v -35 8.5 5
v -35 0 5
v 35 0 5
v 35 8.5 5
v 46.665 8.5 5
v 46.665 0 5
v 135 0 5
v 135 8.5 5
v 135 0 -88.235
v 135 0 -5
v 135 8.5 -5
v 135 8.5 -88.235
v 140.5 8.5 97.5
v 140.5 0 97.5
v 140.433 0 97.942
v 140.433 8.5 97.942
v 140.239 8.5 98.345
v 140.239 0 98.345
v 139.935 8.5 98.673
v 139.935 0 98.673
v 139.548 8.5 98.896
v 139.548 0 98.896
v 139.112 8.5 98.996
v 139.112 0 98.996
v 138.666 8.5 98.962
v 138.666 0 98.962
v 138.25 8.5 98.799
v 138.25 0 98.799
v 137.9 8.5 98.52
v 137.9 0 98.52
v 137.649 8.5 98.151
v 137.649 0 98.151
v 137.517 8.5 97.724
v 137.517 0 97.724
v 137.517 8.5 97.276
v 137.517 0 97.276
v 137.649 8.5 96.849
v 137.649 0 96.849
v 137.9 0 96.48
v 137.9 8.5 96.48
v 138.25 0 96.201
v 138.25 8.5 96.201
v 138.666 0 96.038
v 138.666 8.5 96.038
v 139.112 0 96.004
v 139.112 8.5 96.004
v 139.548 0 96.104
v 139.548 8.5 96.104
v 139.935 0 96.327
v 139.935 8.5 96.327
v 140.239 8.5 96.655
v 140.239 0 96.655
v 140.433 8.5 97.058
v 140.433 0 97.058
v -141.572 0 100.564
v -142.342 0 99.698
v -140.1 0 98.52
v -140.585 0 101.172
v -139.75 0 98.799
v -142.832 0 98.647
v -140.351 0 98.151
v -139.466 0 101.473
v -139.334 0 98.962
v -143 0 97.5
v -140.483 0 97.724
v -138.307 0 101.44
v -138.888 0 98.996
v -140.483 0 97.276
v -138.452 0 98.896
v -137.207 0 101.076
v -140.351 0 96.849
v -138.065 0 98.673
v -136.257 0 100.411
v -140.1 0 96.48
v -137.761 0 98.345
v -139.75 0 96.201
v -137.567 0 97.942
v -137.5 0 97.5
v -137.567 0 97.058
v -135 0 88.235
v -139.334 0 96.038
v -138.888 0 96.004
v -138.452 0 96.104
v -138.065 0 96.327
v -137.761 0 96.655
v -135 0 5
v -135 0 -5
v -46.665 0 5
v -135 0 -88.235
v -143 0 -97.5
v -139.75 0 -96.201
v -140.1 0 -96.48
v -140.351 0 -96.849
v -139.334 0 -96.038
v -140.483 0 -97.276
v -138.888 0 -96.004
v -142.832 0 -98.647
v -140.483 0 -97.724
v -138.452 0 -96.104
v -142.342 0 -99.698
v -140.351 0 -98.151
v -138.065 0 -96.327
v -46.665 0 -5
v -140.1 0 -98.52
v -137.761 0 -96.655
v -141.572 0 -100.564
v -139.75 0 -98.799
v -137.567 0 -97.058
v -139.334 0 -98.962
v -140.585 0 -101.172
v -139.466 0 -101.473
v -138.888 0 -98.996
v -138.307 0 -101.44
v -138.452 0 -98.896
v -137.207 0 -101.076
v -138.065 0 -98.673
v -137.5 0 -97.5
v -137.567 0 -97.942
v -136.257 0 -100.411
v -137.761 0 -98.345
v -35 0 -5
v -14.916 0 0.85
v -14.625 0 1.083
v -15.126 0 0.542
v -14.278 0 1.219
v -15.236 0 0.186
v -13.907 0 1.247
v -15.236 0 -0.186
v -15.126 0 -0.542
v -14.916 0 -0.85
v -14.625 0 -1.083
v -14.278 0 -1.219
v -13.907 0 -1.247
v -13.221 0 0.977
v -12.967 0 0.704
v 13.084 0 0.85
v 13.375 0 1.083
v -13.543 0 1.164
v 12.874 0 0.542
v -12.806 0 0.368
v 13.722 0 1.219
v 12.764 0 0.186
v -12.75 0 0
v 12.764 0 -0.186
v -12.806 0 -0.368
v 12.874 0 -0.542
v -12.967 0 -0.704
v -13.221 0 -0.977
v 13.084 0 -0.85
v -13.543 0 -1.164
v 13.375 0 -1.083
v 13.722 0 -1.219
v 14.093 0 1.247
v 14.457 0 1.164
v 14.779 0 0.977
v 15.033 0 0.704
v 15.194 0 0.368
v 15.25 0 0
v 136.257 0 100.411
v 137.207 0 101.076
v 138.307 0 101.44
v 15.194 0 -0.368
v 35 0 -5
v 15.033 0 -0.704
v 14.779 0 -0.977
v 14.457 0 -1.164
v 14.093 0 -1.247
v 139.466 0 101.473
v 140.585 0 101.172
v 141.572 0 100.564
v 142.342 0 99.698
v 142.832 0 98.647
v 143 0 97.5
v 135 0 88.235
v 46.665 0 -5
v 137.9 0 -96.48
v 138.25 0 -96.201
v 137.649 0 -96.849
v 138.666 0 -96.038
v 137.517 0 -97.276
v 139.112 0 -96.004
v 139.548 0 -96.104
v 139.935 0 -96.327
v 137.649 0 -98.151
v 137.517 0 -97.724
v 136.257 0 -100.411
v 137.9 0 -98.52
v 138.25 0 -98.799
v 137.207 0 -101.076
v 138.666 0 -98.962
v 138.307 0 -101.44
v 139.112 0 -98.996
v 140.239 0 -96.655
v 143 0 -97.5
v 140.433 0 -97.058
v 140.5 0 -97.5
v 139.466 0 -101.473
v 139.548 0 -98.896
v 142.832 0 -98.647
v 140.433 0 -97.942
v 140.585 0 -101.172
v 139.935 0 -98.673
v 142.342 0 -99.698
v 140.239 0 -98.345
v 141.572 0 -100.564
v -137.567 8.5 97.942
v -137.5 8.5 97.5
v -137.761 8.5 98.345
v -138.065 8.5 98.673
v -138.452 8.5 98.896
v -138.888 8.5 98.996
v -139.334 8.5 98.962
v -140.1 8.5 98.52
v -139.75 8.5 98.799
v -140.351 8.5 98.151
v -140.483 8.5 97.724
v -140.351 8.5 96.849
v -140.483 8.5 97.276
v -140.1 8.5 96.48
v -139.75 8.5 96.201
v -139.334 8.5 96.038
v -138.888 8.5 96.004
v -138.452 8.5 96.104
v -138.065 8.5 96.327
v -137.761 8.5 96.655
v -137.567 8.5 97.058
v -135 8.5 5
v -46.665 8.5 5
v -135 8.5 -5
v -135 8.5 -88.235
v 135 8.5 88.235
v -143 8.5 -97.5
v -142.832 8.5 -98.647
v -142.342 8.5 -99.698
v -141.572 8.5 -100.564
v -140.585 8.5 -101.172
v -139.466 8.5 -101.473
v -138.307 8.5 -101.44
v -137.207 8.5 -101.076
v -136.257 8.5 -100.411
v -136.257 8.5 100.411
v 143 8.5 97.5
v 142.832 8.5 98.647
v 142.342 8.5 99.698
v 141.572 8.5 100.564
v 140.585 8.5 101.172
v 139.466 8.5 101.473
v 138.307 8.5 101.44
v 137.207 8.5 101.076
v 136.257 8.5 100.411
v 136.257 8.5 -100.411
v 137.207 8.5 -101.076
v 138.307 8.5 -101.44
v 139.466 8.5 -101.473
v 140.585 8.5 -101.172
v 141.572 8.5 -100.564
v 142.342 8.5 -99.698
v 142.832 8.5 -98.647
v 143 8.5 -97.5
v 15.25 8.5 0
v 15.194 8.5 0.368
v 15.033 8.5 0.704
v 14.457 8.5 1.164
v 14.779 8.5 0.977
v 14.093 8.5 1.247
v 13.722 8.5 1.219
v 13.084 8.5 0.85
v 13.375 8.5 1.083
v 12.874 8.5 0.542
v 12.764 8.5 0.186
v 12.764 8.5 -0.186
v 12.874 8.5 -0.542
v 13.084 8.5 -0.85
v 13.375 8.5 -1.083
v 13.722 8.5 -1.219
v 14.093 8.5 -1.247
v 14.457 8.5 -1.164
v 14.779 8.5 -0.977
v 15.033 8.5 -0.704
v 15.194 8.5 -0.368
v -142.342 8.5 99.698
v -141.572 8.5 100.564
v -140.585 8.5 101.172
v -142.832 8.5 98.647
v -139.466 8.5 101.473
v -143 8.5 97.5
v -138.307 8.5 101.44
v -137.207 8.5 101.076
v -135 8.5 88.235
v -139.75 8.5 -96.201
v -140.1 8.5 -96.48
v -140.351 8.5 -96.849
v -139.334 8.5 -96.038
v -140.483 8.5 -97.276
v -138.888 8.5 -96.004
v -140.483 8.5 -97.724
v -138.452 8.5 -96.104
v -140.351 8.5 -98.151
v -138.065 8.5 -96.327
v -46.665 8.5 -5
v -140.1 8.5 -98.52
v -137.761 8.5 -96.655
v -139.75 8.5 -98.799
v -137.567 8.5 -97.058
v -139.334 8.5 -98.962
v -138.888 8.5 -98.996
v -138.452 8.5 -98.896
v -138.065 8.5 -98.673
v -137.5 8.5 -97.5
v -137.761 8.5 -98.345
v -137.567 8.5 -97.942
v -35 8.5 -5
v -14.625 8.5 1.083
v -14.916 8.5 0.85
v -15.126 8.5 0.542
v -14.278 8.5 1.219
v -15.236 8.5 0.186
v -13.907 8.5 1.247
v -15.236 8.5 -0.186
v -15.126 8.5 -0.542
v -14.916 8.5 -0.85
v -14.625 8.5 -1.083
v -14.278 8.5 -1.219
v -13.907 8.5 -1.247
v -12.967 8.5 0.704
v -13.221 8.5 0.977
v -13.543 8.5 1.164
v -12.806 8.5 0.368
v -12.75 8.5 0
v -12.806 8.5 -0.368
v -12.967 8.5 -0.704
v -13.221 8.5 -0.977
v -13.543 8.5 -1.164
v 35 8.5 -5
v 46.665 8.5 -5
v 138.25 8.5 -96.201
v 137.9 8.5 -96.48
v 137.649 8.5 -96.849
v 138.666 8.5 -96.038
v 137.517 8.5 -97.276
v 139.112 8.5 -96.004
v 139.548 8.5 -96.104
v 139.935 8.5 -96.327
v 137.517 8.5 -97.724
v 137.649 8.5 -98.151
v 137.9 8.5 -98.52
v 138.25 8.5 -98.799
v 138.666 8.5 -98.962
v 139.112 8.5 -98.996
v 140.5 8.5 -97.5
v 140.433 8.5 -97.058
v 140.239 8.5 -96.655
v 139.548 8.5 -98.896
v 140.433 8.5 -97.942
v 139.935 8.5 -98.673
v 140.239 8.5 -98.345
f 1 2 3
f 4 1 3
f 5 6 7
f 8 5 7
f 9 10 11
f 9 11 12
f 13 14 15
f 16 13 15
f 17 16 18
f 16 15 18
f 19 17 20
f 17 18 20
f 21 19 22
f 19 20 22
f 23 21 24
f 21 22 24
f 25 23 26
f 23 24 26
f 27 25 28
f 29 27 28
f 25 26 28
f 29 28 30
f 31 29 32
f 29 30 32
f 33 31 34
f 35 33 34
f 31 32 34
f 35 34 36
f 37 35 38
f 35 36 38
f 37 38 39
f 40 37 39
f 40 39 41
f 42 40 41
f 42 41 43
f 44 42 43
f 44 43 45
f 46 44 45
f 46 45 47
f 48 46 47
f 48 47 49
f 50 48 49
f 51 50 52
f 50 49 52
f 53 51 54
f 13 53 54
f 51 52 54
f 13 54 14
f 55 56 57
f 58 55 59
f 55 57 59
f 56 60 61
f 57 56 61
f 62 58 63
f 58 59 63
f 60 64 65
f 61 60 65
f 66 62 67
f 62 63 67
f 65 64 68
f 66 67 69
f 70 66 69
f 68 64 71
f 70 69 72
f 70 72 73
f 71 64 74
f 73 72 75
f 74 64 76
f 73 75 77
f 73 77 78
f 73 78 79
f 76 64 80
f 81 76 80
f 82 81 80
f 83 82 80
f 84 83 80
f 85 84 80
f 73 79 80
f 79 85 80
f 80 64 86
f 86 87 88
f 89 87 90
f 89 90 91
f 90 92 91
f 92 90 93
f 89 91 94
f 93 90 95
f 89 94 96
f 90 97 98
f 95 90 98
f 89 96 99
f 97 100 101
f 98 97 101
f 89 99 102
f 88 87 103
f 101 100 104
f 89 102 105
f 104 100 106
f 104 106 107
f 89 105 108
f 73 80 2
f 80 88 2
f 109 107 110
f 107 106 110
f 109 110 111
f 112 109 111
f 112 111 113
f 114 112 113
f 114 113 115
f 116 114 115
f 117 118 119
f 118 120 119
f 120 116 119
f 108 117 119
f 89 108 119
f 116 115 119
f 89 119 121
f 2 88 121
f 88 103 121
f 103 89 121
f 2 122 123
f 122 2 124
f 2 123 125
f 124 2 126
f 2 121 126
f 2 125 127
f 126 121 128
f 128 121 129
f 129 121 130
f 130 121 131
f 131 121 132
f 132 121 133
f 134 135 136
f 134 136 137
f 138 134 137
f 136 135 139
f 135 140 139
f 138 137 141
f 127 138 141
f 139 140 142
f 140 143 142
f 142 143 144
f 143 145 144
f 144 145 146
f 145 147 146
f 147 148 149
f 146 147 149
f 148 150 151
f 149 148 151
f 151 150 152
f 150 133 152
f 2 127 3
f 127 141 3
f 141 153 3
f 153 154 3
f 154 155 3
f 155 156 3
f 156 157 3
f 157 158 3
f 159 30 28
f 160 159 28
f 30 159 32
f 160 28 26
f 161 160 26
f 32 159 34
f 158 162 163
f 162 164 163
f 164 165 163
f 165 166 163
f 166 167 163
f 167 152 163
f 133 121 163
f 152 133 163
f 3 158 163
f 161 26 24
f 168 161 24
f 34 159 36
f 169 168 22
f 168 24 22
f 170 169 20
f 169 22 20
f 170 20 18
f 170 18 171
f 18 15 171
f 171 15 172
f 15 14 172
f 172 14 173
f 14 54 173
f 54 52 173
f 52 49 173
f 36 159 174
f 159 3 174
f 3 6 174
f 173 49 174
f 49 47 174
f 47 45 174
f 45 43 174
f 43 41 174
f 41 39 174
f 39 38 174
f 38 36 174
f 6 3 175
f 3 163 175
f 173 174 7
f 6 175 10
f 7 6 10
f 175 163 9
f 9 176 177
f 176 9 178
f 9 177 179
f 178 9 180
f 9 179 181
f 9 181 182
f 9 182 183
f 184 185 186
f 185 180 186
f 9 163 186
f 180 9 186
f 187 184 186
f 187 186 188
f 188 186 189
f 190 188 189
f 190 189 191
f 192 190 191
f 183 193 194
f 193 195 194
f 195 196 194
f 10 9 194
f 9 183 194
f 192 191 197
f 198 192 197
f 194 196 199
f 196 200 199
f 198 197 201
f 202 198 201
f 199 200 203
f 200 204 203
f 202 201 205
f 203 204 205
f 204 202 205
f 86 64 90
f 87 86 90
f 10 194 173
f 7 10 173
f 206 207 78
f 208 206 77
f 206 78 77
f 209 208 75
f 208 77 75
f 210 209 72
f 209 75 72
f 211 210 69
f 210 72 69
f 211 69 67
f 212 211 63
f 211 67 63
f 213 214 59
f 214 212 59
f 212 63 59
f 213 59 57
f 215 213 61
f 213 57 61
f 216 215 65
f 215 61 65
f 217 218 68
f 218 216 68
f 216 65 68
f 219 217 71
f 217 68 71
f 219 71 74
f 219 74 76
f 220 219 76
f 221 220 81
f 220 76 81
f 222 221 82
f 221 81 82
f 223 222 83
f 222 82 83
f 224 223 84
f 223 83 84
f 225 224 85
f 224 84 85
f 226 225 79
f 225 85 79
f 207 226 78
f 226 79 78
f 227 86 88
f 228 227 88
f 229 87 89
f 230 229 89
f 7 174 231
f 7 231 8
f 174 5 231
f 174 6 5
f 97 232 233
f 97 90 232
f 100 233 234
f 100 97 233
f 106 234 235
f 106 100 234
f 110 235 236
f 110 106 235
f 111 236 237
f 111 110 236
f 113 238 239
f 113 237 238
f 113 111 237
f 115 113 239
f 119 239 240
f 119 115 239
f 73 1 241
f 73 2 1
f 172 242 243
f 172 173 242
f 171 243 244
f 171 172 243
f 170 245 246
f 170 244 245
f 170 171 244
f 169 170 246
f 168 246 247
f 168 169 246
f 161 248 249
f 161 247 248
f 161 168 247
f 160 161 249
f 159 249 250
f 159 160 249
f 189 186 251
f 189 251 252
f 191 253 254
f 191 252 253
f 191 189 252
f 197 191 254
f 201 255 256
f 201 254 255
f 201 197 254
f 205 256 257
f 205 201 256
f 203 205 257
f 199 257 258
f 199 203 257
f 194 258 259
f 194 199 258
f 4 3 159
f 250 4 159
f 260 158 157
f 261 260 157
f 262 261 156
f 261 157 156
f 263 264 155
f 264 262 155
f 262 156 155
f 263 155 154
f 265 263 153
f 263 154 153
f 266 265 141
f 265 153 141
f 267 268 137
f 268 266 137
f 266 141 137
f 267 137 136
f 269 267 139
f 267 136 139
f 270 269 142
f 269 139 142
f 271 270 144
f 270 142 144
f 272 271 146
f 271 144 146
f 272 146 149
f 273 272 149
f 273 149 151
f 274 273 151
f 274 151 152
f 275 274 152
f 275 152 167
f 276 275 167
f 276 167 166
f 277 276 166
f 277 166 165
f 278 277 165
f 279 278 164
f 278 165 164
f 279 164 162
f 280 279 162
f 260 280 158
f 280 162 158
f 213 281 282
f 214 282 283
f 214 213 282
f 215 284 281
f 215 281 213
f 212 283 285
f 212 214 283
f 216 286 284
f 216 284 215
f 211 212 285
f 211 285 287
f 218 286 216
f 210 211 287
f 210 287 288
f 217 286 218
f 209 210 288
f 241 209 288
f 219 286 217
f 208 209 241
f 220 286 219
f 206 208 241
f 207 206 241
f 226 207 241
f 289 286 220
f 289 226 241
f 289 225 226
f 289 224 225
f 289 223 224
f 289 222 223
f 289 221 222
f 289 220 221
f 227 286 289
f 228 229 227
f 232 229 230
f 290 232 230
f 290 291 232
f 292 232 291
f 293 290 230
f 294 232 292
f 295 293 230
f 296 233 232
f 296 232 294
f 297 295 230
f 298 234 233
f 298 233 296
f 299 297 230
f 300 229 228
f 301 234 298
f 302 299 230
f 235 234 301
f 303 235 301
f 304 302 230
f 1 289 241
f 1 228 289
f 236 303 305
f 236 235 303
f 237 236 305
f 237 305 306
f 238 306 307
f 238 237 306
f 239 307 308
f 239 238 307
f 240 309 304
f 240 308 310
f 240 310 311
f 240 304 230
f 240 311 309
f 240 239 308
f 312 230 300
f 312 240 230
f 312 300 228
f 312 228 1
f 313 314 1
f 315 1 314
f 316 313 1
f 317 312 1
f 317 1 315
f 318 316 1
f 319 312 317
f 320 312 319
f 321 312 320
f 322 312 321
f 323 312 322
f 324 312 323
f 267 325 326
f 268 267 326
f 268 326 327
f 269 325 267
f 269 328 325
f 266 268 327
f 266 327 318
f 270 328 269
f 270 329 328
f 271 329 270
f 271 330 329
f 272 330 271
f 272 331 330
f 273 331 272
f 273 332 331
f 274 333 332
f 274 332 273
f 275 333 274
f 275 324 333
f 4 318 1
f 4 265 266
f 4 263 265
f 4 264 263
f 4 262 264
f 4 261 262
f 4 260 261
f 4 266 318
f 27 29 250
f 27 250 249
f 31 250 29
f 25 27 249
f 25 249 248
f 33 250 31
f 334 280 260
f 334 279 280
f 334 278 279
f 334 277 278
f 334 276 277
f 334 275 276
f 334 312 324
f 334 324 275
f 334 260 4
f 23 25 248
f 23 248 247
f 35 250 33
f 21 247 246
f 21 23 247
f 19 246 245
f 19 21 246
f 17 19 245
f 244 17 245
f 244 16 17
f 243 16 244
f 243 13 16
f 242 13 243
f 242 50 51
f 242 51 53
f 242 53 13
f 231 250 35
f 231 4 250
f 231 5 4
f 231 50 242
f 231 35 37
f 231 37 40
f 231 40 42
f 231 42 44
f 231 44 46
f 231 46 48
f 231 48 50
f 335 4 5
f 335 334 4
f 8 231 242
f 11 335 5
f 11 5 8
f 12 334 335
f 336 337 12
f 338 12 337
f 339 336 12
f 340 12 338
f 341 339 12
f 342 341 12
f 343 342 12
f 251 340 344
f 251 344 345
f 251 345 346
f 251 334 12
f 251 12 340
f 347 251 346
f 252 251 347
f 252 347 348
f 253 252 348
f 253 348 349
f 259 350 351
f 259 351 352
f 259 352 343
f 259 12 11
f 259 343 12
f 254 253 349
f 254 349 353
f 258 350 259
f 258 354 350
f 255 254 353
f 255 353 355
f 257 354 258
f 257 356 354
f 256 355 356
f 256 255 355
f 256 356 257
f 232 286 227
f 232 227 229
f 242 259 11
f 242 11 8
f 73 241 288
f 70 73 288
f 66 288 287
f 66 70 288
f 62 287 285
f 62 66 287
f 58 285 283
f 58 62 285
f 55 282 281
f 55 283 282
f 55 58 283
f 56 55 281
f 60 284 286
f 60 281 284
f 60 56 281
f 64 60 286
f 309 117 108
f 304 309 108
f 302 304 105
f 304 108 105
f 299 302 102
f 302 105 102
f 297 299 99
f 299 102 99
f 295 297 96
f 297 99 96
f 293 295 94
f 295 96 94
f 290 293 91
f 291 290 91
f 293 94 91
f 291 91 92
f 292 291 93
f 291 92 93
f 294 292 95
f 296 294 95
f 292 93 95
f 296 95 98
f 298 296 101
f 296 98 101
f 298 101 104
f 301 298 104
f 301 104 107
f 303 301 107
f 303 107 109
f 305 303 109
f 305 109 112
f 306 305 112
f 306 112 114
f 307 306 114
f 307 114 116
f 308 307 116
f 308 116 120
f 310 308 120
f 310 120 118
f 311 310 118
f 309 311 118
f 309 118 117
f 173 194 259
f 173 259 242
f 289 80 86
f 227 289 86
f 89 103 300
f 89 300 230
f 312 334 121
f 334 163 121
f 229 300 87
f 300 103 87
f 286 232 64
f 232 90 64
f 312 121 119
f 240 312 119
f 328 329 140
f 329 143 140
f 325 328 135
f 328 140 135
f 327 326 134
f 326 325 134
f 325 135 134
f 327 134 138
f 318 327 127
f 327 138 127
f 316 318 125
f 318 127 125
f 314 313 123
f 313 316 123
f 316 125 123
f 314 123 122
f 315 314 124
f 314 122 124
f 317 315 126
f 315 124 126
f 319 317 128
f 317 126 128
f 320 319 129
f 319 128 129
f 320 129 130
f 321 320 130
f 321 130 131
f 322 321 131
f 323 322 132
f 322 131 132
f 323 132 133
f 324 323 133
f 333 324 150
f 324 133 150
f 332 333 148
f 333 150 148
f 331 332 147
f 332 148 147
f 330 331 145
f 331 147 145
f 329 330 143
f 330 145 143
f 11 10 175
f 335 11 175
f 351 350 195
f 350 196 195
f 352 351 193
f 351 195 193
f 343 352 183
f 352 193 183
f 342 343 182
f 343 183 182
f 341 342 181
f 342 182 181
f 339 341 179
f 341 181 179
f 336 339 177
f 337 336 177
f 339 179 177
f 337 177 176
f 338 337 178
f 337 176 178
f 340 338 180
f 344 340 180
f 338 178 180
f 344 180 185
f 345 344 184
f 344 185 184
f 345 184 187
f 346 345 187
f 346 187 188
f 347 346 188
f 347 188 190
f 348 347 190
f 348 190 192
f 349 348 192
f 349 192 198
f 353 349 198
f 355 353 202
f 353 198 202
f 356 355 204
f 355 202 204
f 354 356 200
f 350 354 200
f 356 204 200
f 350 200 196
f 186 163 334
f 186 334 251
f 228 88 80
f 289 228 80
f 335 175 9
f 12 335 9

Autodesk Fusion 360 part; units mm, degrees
sketch "Sketch1" plane through (0, 0, 0) normal (0, 1, 0) x (1, 0, 0)
  circle A0 centre (-139, -97.5) radius 1.5
  circle A1 centre (139, -97.5) radius 1.5
  circle A2 centre (139, 97.5) radius 1.5
  circle A3 centre (-139, 97.5) radius 1.5
  line L0 (139, -97.5) -> (139, 97.5) construction
  line L1 (139, 97.5) -> (-139, 97.5) construction
  line L2 (-139, 97.5) -> (-139, -97.5) construction
  line L3 (-139, -97.5) -> (139, -97.5) construction
  line L4 (0, -97.5) -> (0, 97.5) construction
  line L5 (139, 0) -> (-139, 0) construction
  circle A4 centre (-139, -97.5) radius 4
  circle A5 centre (-139, 97.5) radius 4
  circle A6 centre (139, 97.5) radius 4
  circle A7 centre (139, -97.5) radius 4
  line L6 (-143, -97.5) -> (-135, -97.5)
  line L7 (-135, -97.5) -> (-135, 97.5)
  line L8 (-135, 97.5) -> (-143, 97.5)
  line L9 (-143, 97.5) -> (-143, -97.5)
  line L10 (143, -97.5) -> (135, -97.5)
  line L11 (135, -97.5) -> (135, 97.5)
  line L12 (135, 97.5) -> (143, 97.5)
  line L13 (143, 97.5) -> (143, -97.5)
  line L14 (-143, -5) -> (143, -5)
  line L15 (143, -5) -> (143, 5)
  line L16 (143, 5) -> (-143, 5)
  line L17 (-143, 5) -> (-143, -5)
  line L18 (-35, -5) -> (-136.2569, -100.4112)
  line L19 (-46.6654, -5) -> (-141.7431, -94.5888)
  line L20 (-136.2569, -100.4112) -> (-141.7431, -94.5888)
  line L21 (35, -5) -> (136.2569, -100.4112)
  line L22 (46.6654, -5) -> (141.7431, -94.5888)
  line L23 (136.2569, -100.4112) -> (141.7431, -94.5888)
  line L24 (-35, 5) -> (-136.2569, 100.4112)
  line L25 (-46.6654, 5) -> (-141.7431, 94.5888)
  line L26 (46.6654, 5) -> (141.7431, 94.5888)
  line L27 (35, 5) -> (136.2569, 100.4112)
  line L28 (136.2569, 100.4112) -> (141.7431, 94.5888)
  line L29 (-136.2569, 100.4112) -> (-141.7431, 94.5888)
  circle A8 centre (-14, 0) radius 1.25
  circle A9 centre (14, 0) radius 1.25
  dimension "d1" = 3
  dimension "d2" = 3
  dimension "d3" = 3
  dimension "d4" = 3
  dimension "d5" = 278
  dimension "d6" = 195
  dimension "d7" = 8
  dimension "d8" = 8
  dimension "d9" = 8
  dimension "d10" = 8
  dimension "d11" = 5
  dimension "d12" = 5
  dimension "d13" = 35
  dimension "d14" = 2.5
  dimension "d15" = 2.5
  dimension "d16" = 14
  dimension "d17" = 14
extrude "Extrude1" add sketch "Sketch1" along normal blind 8.5 contours A0 A4 L6 L20 | A0 A4 L6 L20 | A0 A4 L6 L20 | A0 A4 L6 L20 | A4 L7 L14 L18 L19 | A4 L7 L19 | A4 L7 L9 L14 L19 | L7 L11 L14 L16 | L7 L9 L14 L16 L17 | A7 L11 L14 L21 L22 | A5 L7 L9 L16 L25 | A1 A7 L10 L23 | A1 A7 L10 L23 | A5 L7 L25 | A5 L7 L16 L24 L25 | A3 A5 L8 L29 | A3 A5 L8 L29 | A7 L11 L13 L14 L22 | L11 L13 L14 L15 L16 | A7 L11 L22 | A1 A7 L10 L23 | A1 A7 L10 L23 | A3 A5 L8 L29 | A3 A5 L8 L29 | A6 L11 L13 L16 L26 | A6 L11 L16 L26 L27 | A6 L11 L26 | A2 A6 L12 L28 | A2 A6 L12 L28 | A2 A6 L12 L28 | A2 A6 L12 L28
equation "d2 = d1"
equation "d3 = d2"
equation "d4 = d1"
equation "d8 = d7"
equation "d9 = d7"
equation "d10 = d7"
equation "d12 = d11"
equation "d17 = d16"
